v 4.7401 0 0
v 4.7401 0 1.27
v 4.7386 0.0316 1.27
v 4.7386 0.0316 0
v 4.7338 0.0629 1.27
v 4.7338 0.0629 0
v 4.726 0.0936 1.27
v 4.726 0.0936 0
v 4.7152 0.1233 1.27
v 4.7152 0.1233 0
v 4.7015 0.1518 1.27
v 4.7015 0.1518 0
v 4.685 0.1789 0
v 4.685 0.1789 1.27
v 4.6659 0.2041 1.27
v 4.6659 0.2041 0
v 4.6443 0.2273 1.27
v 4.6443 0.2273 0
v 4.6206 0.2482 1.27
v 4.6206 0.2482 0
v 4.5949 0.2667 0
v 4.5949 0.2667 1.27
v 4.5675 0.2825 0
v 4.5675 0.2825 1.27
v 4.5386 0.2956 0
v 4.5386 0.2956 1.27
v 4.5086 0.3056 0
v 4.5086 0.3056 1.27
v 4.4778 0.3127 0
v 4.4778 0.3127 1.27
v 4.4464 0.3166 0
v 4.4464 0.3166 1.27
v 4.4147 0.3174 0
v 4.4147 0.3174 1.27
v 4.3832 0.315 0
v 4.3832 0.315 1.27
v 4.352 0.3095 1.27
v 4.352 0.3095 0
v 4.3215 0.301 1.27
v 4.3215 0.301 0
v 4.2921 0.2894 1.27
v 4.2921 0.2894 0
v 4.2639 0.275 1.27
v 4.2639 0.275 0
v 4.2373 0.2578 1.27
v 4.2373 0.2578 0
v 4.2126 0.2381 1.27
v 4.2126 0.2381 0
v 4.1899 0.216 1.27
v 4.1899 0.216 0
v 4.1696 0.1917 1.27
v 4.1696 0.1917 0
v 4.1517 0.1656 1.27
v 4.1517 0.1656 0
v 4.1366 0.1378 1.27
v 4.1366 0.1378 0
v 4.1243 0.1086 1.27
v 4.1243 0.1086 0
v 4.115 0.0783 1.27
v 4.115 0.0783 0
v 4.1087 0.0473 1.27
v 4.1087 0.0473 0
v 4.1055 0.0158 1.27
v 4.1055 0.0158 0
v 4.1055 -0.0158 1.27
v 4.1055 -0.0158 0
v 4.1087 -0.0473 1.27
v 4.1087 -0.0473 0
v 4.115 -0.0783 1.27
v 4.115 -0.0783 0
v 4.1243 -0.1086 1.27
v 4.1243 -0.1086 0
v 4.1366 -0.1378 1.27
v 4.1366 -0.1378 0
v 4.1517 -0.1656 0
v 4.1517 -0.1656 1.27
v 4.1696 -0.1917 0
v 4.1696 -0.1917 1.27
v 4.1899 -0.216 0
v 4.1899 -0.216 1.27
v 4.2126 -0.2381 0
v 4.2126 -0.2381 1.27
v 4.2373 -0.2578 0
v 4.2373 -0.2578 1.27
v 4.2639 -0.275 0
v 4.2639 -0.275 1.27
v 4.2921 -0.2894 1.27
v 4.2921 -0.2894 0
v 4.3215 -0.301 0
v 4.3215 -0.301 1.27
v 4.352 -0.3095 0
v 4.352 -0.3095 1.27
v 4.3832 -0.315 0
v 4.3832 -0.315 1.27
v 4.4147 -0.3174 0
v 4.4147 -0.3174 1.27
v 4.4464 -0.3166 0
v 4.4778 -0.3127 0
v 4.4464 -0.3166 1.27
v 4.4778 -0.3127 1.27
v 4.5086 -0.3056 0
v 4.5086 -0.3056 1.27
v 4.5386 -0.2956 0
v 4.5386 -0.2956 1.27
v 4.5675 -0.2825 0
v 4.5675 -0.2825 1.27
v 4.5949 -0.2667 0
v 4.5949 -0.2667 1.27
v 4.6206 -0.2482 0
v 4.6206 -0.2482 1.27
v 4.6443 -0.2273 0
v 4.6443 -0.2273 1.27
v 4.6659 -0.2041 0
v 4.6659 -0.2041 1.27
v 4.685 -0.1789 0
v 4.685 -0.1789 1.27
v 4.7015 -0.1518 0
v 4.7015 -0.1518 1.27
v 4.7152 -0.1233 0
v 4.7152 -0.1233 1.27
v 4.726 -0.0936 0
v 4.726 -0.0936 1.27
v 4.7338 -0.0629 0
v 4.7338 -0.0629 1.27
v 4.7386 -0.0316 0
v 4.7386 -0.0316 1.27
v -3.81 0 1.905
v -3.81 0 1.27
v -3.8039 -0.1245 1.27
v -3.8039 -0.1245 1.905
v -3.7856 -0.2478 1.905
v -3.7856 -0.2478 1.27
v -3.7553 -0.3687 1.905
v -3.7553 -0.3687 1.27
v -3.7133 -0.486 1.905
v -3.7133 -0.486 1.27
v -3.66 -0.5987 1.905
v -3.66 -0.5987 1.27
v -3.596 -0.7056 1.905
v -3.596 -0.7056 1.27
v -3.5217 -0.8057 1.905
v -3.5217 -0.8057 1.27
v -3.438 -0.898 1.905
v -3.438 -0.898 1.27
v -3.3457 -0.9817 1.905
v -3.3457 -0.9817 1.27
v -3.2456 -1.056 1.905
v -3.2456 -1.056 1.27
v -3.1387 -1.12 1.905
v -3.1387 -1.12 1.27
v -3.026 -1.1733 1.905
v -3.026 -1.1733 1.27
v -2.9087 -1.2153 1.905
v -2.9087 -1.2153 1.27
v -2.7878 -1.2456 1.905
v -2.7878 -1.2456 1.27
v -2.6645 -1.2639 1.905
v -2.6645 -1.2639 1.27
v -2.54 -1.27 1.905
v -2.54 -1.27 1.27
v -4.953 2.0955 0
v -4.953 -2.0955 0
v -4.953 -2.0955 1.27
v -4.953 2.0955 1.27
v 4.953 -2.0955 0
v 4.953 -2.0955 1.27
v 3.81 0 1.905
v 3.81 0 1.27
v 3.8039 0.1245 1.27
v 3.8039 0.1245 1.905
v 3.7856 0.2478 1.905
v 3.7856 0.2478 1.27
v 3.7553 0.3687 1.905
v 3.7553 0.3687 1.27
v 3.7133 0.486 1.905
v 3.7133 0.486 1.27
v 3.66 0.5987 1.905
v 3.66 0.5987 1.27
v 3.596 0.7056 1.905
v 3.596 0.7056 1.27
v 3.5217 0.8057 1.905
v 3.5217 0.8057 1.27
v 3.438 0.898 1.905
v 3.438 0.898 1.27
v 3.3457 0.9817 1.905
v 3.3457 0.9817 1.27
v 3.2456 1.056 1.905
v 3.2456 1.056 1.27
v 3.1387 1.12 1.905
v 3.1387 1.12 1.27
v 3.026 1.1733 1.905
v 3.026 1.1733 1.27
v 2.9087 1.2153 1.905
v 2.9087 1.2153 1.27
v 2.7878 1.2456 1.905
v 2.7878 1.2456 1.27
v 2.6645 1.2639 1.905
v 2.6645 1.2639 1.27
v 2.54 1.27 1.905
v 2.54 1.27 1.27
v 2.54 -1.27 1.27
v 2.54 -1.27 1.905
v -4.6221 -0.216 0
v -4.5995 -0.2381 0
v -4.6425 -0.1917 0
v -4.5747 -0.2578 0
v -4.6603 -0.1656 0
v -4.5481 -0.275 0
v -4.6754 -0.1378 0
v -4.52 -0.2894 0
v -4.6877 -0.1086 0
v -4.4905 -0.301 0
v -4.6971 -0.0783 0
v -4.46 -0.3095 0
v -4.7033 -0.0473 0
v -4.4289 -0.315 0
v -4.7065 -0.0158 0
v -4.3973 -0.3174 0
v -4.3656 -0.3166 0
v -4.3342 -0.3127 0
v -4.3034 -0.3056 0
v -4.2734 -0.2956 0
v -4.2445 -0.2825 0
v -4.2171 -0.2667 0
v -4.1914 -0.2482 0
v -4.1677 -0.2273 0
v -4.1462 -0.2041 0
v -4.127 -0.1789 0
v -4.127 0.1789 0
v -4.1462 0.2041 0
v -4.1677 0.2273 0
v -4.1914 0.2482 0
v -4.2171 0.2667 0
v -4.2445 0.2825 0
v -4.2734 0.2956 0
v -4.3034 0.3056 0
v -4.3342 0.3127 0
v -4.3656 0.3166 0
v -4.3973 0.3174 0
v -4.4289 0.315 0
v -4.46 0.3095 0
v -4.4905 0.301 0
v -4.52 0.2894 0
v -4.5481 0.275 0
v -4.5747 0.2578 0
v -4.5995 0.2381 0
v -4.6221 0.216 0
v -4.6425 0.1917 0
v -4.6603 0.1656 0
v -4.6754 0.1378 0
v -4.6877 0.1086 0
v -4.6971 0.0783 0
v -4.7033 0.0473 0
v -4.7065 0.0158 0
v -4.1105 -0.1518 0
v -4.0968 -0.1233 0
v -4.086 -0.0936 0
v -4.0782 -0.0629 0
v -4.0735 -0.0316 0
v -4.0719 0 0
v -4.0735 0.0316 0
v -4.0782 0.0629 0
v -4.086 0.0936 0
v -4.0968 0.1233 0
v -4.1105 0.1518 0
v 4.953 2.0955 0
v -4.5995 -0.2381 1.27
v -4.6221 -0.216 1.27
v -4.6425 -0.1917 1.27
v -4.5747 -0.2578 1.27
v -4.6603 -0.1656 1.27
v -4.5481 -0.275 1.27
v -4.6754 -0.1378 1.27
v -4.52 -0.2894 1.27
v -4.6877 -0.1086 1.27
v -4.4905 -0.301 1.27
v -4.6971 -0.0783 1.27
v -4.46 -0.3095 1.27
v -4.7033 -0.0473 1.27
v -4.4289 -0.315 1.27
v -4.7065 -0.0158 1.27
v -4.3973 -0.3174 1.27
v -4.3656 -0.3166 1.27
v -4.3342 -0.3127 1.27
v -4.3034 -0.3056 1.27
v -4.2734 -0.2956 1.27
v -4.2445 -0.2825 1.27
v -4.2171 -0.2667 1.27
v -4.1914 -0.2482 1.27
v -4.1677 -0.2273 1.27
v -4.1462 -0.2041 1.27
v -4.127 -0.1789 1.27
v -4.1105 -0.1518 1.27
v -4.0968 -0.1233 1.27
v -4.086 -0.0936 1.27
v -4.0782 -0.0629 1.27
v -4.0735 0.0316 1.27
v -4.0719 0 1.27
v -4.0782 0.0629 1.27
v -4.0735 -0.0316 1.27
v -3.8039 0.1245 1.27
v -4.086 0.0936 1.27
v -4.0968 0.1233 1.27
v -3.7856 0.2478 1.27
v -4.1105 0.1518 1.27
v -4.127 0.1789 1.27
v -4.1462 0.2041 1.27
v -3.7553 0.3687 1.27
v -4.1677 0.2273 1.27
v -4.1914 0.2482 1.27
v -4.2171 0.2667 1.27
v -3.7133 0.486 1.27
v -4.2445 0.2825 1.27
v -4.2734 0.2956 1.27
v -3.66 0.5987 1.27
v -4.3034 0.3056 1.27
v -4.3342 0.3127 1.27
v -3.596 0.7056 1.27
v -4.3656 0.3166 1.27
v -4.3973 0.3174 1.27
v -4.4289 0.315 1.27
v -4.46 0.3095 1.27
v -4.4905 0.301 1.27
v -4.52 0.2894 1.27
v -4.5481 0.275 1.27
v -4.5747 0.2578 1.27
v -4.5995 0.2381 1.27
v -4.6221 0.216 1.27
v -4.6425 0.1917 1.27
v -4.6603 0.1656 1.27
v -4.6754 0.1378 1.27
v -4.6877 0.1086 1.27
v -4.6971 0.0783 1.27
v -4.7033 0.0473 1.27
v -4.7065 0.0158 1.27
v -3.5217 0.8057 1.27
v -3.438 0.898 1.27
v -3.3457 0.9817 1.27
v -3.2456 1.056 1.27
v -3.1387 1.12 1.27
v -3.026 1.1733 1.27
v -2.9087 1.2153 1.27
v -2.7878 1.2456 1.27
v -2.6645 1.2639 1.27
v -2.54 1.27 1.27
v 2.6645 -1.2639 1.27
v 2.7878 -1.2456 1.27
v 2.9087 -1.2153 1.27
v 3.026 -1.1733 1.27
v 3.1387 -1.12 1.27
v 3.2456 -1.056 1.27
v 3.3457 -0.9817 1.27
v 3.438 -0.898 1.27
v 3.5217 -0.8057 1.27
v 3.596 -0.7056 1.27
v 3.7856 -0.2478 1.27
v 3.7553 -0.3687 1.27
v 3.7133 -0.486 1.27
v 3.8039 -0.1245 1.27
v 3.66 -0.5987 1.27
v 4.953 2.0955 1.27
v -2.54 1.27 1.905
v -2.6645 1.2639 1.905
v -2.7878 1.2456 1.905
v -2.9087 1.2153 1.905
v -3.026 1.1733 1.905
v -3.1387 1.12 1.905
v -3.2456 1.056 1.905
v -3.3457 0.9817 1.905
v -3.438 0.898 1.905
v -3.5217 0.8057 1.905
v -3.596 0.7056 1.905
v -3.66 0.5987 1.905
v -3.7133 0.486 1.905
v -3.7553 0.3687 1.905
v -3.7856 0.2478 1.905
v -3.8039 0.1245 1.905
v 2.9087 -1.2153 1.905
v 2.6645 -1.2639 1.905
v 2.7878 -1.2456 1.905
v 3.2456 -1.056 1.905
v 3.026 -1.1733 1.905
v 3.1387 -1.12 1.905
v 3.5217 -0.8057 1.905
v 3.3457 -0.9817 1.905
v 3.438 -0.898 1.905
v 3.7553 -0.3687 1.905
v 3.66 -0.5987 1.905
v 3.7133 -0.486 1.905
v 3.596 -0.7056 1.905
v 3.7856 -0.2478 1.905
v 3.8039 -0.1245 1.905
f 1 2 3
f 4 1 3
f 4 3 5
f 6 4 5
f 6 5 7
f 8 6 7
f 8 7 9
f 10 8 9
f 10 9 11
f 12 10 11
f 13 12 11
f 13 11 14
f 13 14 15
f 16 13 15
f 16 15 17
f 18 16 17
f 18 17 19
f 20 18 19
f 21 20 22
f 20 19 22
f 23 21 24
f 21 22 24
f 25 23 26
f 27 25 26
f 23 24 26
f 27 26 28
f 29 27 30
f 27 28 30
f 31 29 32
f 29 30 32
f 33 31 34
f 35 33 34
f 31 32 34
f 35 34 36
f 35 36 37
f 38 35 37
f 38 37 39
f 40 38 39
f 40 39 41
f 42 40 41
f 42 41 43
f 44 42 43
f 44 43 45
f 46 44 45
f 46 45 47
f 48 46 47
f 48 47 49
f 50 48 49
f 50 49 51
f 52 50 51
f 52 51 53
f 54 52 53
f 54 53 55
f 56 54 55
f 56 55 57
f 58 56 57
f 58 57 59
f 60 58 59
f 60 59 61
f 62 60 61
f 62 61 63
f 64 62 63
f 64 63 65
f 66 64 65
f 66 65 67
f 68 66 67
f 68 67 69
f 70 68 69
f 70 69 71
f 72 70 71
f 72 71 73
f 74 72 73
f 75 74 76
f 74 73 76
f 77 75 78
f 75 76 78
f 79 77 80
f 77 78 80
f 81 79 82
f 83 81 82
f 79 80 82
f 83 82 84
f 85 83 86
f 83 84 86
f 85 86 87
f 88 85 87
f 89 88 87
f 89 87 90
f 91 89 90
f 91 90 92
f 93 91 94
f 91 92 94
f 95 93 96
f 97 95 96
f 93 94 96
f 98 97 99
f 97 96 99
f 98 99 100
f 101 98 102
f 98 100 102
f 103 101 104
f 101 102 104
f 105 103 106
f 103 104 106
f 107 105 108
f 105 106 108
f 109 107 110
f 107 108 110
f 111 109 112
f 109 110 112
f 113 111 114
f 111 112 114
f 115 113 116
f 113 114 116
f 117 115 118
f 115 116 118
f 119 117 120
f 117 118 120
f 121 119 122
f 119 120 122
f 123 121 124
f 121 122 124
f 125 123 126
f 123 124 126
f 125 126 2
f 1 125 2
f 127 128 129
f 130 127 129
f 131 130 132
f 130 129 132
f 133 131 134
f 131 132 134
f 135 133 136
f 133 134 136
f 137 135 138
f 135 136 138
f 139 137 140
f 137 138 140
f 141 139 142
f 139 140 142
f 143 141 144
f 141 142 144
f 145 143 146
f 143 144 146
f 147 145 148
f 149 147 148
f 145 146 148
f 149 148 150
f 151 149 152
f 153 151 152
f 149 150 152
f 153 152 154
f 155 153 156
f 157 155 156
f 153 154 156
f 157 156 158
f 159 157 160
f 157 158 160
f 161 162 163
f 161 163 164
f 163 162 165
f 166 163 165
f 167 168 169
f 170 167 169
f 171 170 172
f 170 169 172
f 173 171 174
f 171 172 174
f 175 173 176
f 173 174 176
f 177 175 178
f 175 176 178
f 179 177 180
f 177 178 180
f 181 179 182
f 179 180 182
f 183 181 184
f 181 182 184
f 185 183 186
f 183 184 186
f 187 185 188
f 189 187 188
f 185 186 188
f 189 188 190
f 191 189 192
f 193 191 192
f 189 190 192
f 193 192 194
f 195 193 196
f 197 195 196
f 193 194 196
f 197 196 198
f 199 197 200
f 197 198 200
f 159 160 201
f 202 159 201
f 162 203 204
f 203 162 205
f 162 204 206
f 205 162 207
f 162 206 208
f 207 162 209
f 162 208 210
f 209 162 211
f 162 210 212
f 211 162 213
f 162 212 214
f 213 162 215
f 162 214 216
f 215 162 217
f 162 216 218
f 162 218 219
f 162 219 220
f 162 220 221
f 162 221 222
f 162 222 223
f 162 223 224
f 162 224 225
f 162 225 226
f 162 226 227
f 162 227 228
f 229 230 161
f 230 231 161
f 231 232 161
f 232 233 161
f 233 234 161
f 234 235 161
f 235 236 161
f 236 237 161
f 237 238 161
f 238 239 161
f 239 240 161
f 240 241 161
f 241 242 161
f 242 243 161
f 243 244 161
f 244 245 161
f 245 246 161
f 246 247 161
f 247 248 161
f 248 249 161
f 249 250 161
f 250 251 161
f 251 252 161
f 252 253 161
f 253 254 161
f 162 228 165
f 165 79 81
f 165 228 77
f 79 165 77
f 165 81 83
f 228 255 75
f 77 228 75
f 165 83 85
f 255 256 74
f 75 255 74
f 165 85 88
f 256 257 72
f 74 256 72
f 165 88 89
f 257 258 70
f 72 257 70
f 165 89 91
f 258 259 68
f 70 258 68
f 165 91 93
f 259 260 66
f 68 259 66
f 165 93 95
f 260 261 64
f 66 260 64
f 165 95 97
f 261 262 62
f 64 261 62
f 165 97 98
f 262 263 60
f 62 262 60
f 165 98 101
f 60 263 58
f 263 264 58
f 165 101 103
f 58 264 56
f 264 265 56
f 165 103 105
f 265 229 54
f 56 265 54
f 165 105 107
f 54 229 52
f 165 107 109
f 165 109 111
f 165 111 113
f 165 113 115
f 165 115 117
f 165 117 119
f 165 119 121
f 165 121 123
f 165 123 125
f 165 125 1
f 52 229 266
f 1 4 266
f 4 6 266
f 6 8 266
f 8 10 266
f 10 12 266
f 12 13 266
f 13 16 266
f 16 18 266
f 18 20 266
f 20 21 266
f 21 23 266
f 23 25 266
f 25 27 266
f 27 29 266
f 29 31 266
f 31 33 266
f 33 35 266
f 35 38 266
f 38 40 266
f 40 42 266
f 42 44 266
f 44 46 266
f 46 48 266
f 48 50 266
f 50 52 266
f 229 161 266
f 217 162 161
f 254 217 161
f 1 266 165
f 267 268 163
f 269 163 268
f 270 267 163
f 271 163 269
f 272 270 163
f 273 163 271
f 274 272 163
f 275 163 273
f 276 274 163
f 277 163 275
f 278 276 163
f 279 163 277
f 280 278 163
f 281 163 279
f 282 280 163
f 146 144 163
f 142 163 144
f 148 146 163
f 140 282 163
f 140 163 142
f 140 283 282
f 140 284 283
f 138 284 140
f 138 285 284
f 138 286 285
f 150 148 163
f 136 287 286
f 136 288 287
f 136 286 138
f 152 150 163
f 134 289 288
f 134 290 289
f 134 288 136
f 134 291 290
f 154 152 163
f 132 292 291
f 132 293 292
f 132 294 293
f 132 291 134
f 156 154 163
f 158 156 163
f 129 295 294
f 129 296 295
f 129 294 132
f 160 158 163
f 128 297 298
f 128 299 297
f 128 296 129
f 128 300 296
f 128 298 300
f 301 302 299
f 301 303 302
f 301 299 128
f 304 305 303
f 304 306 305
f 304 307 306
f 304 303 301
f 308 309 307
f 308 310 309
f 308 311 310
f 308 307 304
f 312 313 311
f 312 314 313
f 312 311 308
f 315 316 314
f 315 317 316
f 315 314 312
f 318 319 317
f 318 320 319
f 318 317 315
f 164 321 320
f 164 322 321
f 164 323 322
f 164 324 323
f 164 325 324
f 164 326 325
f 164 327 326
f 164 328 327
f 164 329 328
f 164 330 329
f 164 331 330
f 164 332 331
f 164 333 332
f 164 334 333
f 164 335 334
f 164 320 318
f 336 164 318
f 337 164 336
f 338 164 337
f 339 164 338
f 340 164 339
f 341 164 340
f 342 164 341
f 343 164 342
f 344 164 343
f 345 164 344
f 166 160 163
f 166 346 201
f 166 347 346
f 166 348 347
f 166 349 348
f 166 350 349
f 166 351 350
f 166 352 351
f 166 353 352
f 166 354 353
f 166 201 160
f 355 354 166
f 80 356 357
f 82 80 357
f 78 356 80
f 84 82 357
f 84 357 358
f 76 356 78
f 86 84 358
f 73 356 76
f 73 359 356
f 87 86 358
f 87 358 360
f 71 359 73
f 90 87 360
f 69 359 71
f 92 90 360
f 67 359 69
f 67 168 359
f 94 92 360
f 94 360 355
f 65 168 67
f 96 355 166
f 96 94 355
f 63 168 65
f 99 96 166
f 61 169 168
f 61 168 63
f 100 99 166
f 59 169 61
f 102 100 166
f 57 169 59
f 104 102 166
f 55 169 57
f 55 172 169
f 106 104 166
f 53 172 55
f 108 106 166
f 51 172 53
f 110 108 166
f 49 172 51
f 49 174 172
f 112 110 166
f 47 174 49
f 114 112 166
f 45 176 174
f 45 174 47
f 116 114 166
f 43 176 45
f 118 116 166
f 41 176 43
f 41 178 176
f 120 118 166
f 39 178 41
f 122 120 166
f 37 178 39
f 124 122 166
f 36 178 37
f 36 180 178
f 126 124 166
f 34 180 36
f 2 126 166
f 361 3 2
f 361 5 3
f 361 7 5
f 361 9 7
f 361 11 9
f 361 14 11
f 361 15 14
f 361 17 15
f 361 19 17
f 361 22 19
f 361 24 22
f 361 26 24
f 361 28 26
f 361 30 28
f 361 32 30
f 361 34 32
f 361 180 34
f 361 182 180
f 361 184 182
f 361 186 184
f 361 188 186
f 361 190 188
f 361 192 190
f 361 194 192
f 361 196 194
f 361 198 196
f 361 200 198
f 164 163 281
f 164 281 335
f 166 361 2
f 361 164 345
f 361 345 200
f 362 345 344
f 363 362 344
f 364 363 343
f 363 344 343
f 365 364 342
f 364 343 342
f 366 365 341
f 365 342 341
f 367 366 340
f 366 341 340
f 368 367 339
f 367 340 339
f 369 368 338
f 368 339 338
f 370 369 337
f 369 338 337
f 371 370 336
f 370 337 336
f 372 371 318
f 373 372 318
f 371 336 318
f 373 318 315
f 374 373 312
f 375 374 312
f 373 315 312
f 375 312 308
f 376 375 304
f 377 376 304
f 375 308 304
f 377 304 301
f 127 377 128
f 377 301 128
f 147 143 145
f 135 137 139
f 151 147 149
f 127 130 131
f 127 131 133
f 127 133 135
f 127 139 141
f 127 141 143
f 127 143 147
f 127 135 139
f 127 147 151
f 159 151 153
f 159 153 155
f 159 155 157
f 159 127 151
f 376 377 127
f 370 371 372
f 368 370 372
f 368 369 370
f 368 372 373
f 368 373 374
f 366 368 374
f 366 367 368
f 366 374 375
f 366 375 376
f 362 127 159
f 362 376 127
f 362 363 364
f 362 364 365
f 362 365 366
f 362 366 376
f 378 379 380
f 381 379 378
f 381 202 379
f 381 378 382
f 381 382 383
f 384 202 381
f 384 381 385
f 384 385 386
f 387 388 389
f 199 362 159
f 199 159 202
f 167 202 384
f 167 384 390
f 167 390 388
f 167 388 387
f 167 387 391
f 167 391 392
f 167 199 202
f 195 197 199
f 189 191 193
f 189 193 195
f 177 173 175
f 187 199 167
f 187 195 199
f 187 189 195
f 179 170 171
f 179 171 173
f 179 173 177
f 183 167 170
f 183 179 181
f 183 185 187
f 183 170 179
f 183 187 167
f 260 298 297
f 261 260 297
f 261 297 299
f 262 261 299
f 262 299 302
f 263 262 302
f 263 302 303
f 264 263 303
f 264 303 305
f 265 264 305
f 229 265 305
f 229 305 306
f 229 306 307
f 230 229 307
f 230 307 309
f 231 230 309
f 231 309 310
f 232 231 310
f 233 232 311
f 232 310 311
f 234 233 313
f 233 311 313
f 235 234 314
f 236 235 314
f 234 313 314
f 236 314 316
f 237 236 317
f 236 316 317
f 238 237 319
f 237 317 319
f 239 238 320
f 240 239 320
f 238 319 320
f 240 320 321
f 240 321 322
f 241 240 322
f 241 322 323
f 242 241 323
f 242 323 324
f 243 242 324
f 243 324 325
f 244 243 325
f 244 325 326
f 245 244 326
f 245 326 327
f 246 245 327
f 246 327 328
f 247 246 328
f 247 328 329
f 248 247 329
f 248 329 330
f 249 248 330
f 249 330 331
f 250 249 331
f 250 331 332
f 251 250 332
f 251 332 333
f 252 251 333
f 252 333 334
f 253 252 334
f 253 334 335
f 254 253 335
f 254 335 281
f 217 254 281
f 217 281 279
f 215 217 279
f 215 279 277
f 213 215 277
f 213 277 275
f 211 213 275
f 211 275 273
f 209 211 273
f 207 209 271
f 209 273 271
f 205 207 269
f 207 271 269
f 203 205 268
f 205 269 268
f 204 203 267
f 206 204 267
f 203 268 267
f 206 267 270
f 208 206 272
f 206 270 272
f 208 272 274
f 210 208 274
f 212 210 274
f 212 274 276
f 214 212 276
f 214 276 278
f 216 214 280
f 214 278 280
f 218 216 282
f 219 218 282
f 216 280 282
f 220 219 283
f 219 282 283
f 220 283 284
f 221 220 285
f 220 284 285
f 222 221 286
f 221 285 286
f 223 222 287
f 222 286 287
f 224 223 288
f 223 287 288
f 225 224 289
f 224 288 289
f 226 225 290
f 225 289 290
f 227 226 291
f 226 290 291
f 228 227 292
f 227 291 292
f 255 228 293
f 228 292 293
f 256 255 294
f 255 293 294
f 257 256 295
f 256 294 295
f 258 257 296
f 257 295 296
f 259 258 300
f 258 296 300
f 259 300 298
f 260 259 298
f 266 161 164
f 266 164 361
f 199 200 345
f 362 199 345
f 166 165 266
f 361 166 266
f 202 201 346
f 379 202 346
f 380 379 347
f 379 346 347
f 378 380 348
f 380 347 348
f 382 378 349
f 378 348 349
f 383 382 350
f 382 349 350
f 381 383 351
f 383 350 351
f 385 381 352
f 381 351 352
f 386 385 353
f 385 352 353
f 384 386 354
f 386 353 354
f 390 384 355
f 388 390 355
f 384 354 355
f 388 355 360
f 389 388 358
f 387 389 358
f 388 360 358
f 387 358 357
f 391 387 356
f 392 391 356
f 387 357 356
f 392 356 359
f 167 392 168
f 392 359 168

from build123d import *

# Parameters (mm, degrees)
F0_W     = 9.906
F0_H     = 4.191
F1_DEPTH = 1.27
F3_DEPTH = 0.635
F4_R     = 0.3175
F5_DEPTH = 25.4


with BuildPart() as f1:
    # F0 (on Top) → F1 (new body)
    with BuildSketch(Plane.XY):
        Rectangle(F0_W, F0_H)
    extrude(amount=F1_DEPTH)

    # F2 (on face) → F3 (join)
    with BuildSketch(Plane.XY.offset(1.27)):
        with BuildLine():
            ThreePointArc((3.81, 0), (3.438026, 0.898026), (2.54, 1.27))
            Line((2.54, 1.27), (-2.54, 1.27))
            ThreePointArc((-2.54, 1.27), (-3.438026, 0.898026), (-3.81, 0))
            ThreePointArc((-3.81, 0), (-3.438026, -0.898026), (-2.54, -1.27))
            Line((-2.54, -1.27), (2.54, -1.27))
            ThreePointArc((2.54, -1.27), (3.438026, -0.898026), (3.81, 0))
        make_face()
    extrude(amount=F3_DEPTH)

    # F4 (on face) → F5 (cut)
    with BuildSketch(Plane.XY.offset(1.27)):
        with Locations((4.422641, 0)):
            Circle(F4_R)
        with Locations((-4.389373, 0)):
            Circle(F4_R)
    extrude(amount=-F5_DEPTH, mode=Mode.SUBTRACT)


solid = f1.part
